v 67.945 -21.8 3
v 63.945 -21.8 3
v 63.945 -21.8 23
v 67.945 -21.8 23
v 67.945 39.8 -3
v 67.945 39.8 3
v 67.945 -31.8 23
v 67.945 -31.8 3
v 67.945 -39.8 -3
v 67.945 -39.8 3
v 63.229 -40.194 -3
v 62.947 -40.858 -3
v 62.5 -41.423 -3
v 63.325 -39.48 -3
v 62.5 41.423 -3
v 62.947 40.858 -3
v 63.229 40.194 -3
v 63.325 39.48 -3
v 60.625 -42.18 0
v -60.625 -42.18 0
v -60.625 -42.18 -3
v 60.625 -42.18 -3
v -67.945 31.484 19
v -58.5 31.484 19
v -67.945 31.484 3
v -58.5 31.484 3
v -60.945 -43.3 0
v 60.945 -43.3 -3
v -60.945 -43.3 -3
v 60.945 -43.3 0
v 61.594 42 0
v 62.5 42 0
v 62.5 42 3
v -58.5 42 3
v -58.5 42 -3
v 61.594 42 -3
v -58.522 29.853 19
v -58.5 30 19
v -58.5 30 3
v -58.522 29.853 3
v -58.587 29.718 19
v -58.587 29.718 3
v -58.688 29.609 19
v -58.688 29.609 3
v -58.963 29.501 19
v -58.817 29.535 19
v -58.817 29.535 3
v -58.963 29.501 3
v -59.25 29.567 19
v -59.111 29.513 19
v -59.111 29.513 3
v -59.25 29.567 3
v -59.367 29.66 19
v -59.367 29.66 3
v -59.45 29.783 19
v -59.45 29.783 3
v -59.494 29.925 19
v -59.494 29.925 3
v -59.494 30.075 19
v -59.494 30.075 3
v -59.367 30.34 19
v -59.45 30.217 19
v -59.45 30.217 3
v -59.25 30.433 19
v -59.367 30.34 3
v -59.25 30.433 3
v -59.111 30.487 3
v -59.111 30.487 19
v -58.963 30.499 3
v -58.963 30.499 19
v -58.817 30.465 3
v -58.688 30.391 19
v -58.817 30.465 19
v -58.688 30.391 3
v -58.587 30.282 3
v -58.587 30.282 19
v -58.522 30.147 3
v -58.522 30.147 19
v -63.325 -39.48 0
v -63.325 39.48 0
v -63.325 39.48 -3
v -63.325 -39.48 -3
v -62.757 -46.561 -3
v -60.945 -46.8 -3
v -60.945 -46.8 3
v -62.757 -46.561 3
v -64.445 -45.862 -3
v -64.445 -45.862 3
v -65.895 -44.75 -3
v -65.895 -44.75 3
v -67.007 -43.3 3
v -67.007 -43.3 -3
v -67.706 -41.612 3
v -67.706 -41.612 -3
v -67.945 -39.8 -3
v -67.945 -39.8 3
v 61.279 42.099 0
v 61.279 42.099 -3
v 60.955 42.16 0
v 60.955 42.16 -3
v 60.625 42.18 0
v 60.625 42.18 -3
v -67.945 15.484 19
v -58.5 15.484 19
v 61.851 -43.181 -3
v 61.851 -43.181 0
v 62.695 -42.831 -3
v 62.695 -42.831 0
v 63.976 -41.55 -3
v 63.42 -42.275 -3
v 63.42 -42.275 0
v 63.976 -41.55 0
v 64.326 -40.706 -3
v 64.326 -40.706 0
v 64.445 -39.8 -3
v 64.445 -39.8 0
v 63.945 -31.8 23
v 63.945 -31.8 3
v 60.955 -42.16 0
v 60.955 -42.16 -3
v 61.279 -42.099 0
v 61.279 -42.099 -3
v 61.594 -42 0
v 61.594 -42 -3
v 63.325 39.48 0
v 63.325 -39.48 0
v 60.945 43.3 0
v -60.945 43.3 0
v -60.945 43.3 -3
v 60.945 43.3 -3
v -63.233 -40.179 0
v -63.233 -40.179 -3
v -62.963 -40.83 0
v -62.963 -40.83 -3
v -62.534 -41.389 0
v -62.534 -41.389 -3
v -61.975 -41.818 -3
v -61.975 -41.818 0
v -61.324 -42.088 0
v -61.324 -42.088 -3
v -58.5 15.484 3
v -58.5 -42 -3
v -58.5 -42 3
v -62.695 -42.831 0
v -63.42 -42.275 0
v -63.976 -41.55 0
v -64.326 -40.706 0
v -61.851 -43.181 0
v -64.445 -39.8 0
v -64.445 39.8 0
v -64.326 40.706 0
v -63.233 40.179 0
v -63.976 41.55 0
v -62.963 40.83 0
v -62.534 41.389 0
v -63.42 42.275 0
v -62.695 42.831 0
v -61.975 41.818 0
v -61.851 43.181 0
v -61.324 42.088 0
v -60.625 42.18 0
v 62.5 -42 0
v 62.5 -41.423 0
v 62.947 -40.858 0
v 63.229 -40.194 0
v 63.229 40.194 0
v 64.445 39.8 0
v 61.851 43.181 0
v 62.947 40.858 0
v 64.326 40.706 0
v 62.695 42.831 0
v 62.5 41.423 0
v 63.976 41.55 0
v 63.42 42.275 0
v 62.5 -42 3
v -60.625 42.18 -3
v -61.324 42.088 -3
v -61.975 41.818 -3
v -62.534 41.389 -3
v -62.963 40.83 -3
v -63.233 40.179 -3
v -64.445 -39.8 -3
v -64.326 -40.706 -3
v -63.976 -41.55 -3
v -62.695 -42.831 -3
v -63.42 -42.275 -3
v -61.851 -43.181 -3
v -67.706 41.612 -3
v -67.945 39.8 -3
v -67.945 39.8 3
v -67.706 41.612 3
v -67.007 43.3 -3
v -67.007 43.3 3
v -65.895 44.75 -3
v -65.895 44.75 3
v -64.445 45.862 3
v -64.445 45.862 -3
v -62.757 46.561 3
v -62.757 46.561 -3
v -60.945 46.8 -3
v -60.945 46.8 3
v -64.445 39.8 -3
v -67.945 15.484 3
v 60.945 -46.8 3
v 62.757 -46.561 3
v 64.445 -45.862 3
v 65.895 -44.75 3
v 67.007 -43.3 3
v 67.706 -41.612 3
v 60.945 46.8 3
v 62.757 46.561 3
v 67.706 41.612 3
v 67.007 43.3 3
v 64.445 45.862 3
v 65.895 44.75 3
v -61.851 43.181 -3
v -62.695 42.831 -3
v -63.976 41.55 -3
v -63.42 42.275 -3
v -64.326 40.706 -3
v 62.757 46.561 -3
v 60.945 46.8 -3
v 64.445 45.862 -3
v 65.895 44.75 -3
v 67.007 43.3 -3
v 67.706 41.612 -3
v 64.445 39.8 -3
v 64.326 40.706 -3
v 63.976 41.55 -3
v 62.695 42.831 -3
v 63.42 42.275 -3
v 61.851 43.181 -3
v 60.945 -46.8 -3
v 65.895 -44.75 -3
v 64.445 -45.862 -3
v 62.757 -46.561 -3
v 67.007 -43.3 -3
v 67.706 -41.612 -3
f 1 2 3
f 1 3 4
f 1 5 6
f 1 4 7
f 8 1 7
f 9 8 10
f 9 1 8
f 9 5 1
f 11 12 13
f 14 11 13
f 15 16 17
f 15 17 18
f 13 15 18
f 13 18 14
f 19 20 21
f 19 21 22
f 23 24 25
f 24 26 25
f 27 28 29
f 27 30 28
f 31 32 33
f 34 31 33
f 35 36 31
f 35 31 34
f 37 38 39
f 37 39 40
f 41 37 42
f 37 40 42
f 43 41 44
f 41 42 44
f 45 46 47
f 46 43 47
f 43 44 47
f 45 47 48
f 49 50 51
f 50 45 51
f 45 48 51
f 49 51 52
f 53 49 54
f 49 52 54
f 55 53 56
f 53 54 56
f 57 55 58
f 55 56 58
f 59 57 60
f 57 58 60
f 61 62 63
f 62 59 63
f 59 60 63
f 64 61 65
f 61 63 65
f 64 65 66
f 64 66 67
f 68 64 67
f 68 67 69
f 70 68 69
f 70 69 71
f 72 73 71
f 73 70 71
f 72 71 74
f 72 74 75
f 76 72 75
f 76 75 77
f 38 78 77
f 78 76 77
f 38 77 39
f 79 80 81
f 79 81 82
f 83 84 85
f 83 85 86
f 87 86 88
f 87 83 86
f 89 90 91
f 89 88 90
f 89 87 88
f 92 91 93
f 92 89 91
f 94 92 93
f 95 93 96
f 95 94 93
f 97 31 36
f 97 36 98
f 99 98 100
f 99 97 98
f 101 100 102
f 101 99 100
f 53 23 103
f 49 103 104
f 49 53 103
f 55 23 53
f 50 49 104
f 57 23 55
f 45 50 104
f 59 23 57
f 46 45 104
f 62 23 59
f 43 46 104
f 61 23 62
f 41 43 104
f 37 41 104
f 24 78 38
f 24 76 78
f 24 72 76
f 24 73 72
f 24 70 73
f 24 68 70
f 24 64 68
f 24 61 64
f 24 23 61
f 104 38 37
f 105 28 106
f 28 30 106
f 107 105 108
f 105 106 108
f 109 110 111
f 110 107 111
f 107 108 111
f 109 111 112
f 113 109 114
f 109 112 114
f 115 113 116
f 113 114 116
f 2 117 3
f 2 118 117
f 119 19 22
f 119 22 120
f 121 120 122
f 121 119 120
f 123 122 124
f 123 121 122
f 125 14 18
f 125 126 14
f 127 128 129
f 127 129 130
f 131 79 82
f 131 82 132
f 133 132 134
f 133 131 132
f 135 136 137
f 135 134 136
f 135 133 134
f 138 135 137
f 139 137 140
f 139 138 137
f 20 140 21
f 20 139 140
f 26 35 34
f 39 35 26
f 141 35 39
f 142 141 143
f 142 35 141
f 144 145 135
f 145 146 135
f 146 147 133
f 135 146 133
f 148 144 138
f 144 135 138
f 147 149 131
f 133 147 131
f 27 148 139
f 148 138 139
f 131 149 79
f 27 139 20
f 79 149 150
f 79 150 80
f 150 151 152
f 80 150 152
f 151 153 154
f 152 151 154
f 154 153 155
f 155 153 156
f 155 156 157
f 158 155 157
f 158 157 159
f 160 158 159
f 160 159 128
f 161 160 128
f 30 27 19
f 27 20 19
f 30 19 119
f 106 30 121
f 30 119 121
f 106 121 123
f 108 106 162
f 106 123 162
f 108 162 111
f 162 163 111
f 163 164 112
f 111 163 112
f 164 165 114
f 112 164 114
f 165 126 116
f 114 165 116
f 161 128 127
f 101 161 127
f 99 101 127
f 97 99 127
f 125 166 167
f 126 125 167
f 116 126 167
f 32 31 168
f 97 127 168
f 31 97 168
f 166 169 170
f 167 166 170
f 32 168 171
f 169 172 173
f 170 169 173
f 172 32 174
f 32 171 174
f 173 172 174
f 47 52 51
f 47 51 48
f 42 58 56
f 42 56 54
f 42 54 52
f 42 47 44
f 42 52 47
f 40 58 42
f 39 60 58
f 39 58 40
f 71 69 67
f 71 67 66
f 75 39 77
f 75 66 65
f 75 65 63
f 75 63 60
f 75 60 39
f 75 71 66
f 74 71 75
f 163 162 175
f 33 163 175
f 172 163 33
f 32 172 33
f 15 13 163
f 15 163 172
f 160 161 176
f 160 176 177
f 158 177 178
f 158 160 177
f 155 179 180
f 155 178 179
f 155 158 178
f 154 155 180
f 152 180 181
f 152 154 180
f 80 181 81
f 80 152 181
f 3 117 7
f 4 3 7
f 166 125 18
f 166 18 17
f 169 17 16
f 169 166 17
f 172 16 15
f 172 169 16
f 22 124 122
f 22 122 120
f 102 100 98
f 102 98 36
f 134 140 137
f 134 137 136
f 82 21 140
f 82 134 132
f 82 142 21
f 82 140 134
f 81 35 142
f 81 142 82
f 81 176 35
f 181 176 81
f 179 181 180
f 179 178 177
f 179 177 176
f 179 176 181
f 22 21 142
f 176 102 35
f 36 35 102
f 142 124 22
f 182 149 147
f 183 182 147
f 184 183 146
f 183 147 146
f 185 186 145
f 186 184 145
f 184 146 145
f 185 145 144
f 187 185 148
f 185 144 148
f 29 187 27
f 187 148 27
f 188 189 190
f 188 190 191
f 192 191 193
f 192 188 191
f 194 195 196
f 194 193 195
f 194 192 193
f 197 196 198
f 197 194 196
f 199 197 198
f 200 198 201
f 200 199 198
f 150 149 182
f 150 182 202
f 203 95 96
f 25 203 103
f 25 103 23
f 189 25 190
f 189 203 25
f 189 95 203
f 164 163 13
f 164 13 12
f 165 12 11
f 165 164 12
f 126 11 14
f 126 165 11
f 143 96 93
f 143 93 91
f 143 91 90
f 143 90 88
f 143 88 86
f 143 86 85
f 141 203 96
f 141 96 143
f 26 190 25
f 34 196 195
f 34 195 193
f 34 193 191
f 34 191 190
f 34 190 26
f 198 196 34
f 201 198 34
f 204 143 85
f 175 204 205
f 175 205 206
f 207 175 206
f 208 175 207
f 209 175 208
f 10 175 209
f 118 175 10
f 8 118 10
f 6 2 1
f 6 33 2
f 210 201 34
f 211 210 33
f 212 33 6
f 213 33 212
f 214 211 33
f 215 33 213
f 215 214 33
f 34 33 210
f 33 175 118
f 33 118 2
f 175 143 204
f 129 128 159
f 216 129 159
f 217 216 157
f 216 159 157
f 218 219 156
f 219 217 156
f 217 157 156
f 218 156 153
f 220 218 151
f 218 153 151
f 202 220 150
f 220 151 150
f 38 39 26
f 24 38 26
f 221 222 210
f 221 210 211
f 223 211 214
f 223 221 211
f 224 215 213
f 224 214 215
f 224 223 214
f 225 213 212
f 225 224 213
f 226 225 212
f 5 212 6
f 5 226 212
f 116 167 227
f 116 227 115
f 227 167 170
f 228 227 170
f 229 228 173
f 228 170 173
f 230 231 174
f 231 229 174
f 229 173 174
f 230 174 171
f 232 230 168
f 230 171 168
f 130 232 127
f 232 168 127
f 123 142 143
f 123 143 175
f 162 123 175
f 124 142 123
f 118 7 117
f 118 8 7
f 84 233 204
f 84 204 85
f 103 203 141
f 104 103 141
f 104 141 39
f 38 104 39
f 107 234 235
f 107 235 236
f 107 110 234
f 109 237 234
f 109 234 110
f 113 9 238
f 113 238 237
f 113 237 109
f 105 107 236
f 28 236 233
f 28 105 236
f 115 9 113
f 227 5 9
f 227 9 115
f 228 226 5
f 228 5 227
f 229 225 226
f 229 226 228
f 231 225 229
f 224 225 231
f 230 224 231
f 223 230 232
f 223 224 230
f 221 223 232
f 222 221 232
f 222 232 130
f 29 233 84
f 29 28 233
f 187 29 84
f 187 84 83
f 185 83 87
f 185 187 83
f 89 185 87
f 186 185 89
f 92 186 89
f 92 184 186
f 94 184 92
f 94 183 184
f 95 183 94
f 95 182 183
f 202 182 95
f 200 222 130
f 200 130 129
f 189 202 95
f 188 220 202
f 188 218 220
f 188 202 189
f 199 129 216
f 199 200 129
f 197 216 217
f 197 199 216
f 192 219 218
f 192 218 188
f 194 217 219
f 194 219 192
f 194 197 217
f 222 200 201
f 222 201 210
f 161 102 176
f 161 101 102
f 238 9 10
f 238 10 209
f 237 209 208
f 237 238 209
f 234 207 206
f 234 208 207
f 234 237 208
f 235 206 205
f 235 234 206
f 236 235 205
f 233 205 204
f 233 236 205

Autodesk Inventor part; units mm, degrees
ref_plane "YZ Plane" through (0, 0, 0) normal (1, 0, 0) x (0, 1, 0)
ref_plane "XZ Plane" through (0, 0, 0) normal (0, 1, 0) x (-1, 0, 0)
ref_plane "XY Plane" through (0, 0, 0) normal (0, 0, 1) x (1, 0, 0)
ref_plane "Work Plane1" through (-7.109, -3.9363, 0) normal (0, 0, 1) x (1, 0, 0)
sketch "Sketch1" plane through (-7.109, -3.9363, 0) normal (0, 0, 1) x (1, 0, 0)
  line L0 (71.054, 43.7363) -> (71.054, -35.8637) construction
  arc A0 (71.054, 43.7363) -> (68.054, 46.7363) centre (68.054, 43.7363) ccw construction
  line L1 (-53.836, 46.7363) -> (68.054, 46.7363) construction
  arc A1 (-53.836, 46.7363) -> (-56.836, 43.7363) centre (-53.836, 43.7363) ccw construction
  line L2 (-56.836, -35.8637) -> (-56.836, 43.7363) construction
  arc A2 (-56.836, -35.8637) -> (-53.836, -38.8637) centre (-53.836, -35.8637) ccw construction
  line L3 (68.054, -38.8637) -> (-53.836, -38.8637) construction
  arc A3 (68.054, -38.8637) -> (71.054, -35.8637) centre (68.054, -35.8637) ccw construction
  line L4 (-56.516, -35.5437) -> (-56.516, 43.4163) construction
  arc A4 (-53.516, 46.4163) -> (-56.516, 43.4163) centre (-53.516, 43.4163) ccw construction
  line L5 (-53.516, 46.4163) -> (67.734, 46.4163) construction
  arc A5 (70.734, 43.4163) -> (67.734, 46.4163) centre (67.734, 43.4163) ccw construction
  line L6 (70.734, 43.4163) -> (70.734, -35.5437) construction
  arc A6 (67.734, -38.5437) -> (70.734, -35.5437) centre (67.734, -35.5437) ccw construction
  line L7 (67.734, -38.5437) -> (-53.516, -38.5437) construction
  arc A7 (-56.516, -35.5437) -> (-53.516, -38.5437) centre (-53.516, -35.5437) ccw construction
  arc A8 (75.054, 43.7363) -> (68.054, 50.7363) centre (68.054, 43.7363) ccw
  line L8 (75.054, 43.7363) -> (75.054, -35.8637)
  arc A9 (68.054, -42.8637) -> (75.054, -35.8637) centre (68.054, -35.8637) ccw
  line L9 (68.054, -42.8637) -> (-53.836, -42.8637)
  arc A10 (-60.836, -35.8637) -> (-53.836, -42.8637) centre (-53.836, -35.8637) ccw
  line L10 (-60.836, -35.8637) -> (-60.836, 43.7363)
  arc A11 (-53.836, 50.7363) -> (-60.836, 43.7363) centre (-53.836, 43.7363) ccw
  line L11 (-53.836, 50.7363) -> (68.054, 50.7363)
  circle A12 centre (53.6173, 21.8363) radius 4 construction
  circle A13 centre (53.6173, 3.8363) radius 4 construction
  circle A14 centre (53.6173, -14.1637) radius 4 construction
  circle A15 centre (35.6173, 21.8363) radius 4 construction
  circle A16 centre (35.6173, 3.8363) radius 4 construction
  circle A17 centre (35.6173, -14.1637) radius 4 construction
  circle A18 centre (17.6173, 21.8363) radius 4 construction
  circle A19 centre (17.6173, 3.8363) radius 4 construction
  circle A20 centre (17.6173, -14.1637) radius 4 construction
  circle A21 centre (-0.3827, 21.8363) radius 4 construction
  circle A22 centre (-0.3827, 3.8363) radius 4 construction
  circle A23 centre (-0.3827, -14.1637) radius 4 construction
  circle A24 centre (-18.3827, 21.8363) radius 4 construction
  circle A25 centre (-18.3827, 3.8363) radius 4 construction
  circle A26 centre (-18.3827, -14.1637) radius 4 construction
  circle A27 centre (-36.3827, 21.8363) radius 4 construction
  circle A28 centre (-36.3827, 3.8363) radius 4 construction
  circle A29 centre (-36.3827, -14.1637) radius 4 construction
  circle A30 centre (-36.3827, 30.7863) radius 4.375 construction
  circle A31 centre (-18.3827, 30.7863) radius 4.375 construction
  circle A32 centre (-0.3827, 30.7863) radius 4.375 construction
  circle A33 centre (17.6173, 30.7863) radius 4.375 construction
  circle A34 centre (35.6173, 30.7863) radius 4.375 construction
  circle A35 centre (53.6173, 30.7863) radius 4.375 construction
  circle A36 centre (-36.3827, 12.7863) radius 4.375 construction
  circle A37 centre (-18.3827, 12.7863) radius 4.375 construction
  circle A38 centre (-0.3827, 12.7863) radius 4.375 construction
  circle A39 centre (17.6173, 12.7863) radius 4.375 construction
  circle A40 centre (35.6173, 12.7863) radius 4.375 construction
  circle A41 centre (53.6173, 12.7863) radius 4.375 construction
  circle A42 centre (-36.3827, -5.2137) radius 4.375 construction
  circle A43 centre (-18.3827, -5.2137) radius 4.375 construction
  circle A44 centre (-0.3827, -5.2137) radius 4.375 construction
  circle A45 centre (17.6173, -5.2137) radius 4.375 construction
  circle A46 centre (35.6173, -5.2137) radius 4.375 construction
  circle A47 centre (53.6173, -5.2137) radius 4.375 construction
  circle A48 centre (-36.3827, -23.2137) radius 4.375 construction
  circle A49 centre (-18.3827, -23.2137) radius 4.375 construction
  circle A50 centre (-0.3827, -23.2137) radius 4.375 construction
  circle A51 centre (17.6173, -23.2137) radius 4.375 construction
  circle A52 centre (35.6173, -23.2137) radius 4.375 construction
  circle A53 centre (53.6173, -23.2137) radius 4.375 construction
  arc A54 (57.7361, 42.9363) -> (61.1439, 37.9635) centre (61.609, 41.9363) ccw construction
  line L12 (-39.518, 42.9363) -> (57.7361, 42.9363) construction
  arc A55 (-42.9259, 37.9635) -> (-39.518, 42.9363) centre (-43.391, 41.9363) ccw construction
  arc A56 (-48.391, 33.7282) -> (-42.9259, 37.9635) centre (-46.891, 37.4363) ccw construction
  line L13 (-48.391, -25.8556) -> (-48.391, 33.7282) construction
  arc A57 (-42.9259, -30.0908) -> (-48.391, -25.8556) centre (-46.891, -29.5637) ccw construction
  arc A58 (-39.518, -35.0637) -> (-42.9259, -30.0908) centre (-43.391, -34.0637) ccw construction
  line L14 (57.7361, -35.0637) -> (-39.518, -35.0637) construction
  arc A59 (61.1439, -30.0908) -> (57.7361, -35.0637) centre (61.609, -34.0637) ccw construction
  arc A60 (66.609, -25.8556) -> (61.1439, -30.0908) centre (65.109, -29.5637) ccw construction
  line L15 (66.609, 33.7282) -> (66.609, -25.8556) construction
  arc A61 (61.1439, 37.9635) -> (66.609, 33.7282) centre (65.109, 37.4363) ccw construction
  arc A62 (67.609, -27.9054) -> (62.6207, -31.2394) centre (65.109, -29.5637) ccw construction
  arc A63 (62.6207, -31.2394) -> (59.373, -36.0637) centre (61.609, -34.0637) ccw construction
  line L16 (59.373, -36.0637) -> (-41.1549, -36.0637) construction
  arc A64 (-41.1549, -36.0637) -> (-44.4026, -31.2394) centre (-43.391, -34.0637) ccw construction
  arc A65 (-44.4026, -31.2394) -> (-49.391, -27.9054) centre (-46.891, -29.5637) ccw construction
  line L17 (-49.391, -27.9054) -> (-49.391, 35.778) construction
  arc A66 (-49.391, 35.778) -> (-44.4026, 39.112) centre (-46.891, 37.4363) ccw construction
  arc A67 (-44.4026, 39.112) -> (-41.1549, 43.9363) centre (-43.391, 41.9363) ccw construction
  line L18 (-41.1549, 43.9363) -> (59.373, 43.9363) construction
  arc A68 (59.373, 43.9363) -> (62.6207, 39.112) centre (61.609, 41.9363) ccw construction
  arc A69 (62.6207, 39.112) -> (67.609, 35.778) centre (65.109, 37.4363) ccw construction
  line L19 (67.609, 35.778) -> (67.609, -27.9054) construction
  line L20 (69.609, 45.9363) -> (-51.391, 45.9363)
  line L21 (-51.391, 45.9363) -> (-51.391, -38.0637)
  line L22 (-51.391, -38.0637) -> (69.609, -38.0637)
  line L23 (69.609, -38.0637) -> (69.609, 45.9363)
  point P0 (7.109, 3.9363)
  dimension "d0" = 4
  dimension "d1" = 1
  dimension "d10" = 2
  dimension "d11" = 2
  dimension "d12" = 2
  dimension "d13" = 2
extrude "Extrusion1" add sketch "Sketch1" along normal blind 3
sketch "Sketch2" plane through (-7.109, -3.9363, 0) normal (0, 0, -1) x (-1, 0, 0)
  line L0 (-71.054, 43.7363) -> (-71.054, -35.8637) construction
  arc A0 (-68.054, 46.7363) -> (-71.054, 43.7363) centre (-68.054, 43.7363) ccw construction
  line L1 (53.836, 46.7363) -> (-68.054, 46.7363) construction
  arc A1 (56.836, 43.7363) -> (53.836, 46.7363) centre (53.836, 43.7363) ccw construction
  line L2 (56.836, -35.8637) -> (56.836, 43.7363) construction
  arc A2 (53.836, -38.8637) -> (56.836, -35.8637) centre (53.836, -35.8637) ccw construction
  line L3 (-68.054, -38.8637) -> (53.836, -38.8637) construction
  arc A3 (-71.054, -35.8637) -> (-68.054, -38.8637) centre (-68.054, -35.8637) ccw construction
  line L4 (56.516, -35.5437) -> (56.516, 43.4163) construction
  arc A4 (56.516, 43.4163) -> (53.516, 46.4163) centre (53.516, 43.4163) ccw construction
  line L5 (53.516, 46.4163) -> (-67.734, 46.4163) construction
  arc A5 (-67.734, 46.4163) -> (-70.734, 43.4163) centre (-67.734, 43.4163) ccw construction
  line L6 (-70.734, 43.4163) -> (-70.734, -35.5437) construction
  arc A6 (-70.734, -35.5437) -> (-67.734, -38.5437) centre (-67.734, -35.5437) ccw construction
  line L7 (-67.734, -38.5437) -> (53.516, -38.5437) construction
  arc A7 (53.516, -38.5437) -> (56.516, -35.5437) centre (53.516, -35.5437) ccw construction
  arc A8 (-68.054, 47.2363) -> (-71.554, 43.7363) centre (-68.054, 43.7363) ccw
  line L8 (-71.554, 43.7363) -> (-71.554, -35.8637)
  arc A9 (-71.554, -35.8637) -> (-68.054, -39.3637) centre (-68.054, -35.8637) ccw
  line L9 (-68.054, -39.3637) -> (53.836, -39.3637)
  arc A10 (53.836, -39.3637) -> (57.336, -35.8637) centre (53.836, -35.8637) ccw
  line L10 (57.336, -35.8637) -> (57.336, 43.7363)
  arc A11 (57.336, 43.7363) -> (53.836, 47.2363) centre (53.836, 43.7363) ccw
  line L11 (53.836, 47.2363) -> (-68.054, 47.2363)
  arc A12 (56.216, 43.4163) -> (53.516, 46.1163) centre (53.516, 43.4163) ccw
  line L12 (56.216, 43.4163) -> (56.216, -35.5437)
  arc A13 (53.516, -38.2437) -> (56.216, -35.5437) centre (53.516, -35.5437) ccw
  line L13 (53.516, -38.2437) -> (-67.734, -38.2437)
  arc A14 (-70.434, -35.5437) -> (-67.734, -38.2437) centre (-67.734, -35.5437) ccw
  line L14 (-70.434, -35.5437) -> (-70.434, 43.4163)
  arc A15 (-67.734, 46.1163) -> (-70.434, 43.4163) centre (-67.734, 43.4163) ccw
  line L15 (-67.734, 46.1163) -> (53.516, 46.1163)
  line L16 (-69.609, 45.9363) -> (-69.609, -38.0637) projected
  line L17 (-69.609, -38.0637) -> (51.391, -38.0637) projected
  line L18 (51.391, -38.0637) -> (51.391, 45.9363) projected
  line L19 (51.391, 45.9363) -> (-69.609, 45.9363) projected
  arc A16 (-68.054, 50.7363) -> (-75.054, 43.7363) centre (-68.054, 43.7363) ccw projected
  line L20 (-68.054, 50.7363) -> (53.836, 50.7363) projected
  arc A17 (60.836, 43.7363) -> (53.836, 50.7363) centre (53.836, 43.7363) ccw projected
  line L21 (60.836, 43.7363) -> (60.836, -35.8637) projected
  arc A18 (53.836, -42.8637) -> (60.836, -35.8637) centre (53.836, -35.8637) ccw projected
  line L22 (53.836, -42.8637) -> (-68.054, -42.8637) projected
  arc A19 (-75.054, -35.8637) -> (-68.054, -42.8637) centre (-68.054, -35.8637) ccw projected
  line L23 (-75.054, -35.8637) -> (-75.054, 43.7363) projected
  point P0 (-7.109, 3.9363)
  dimension "d4" = 0.5
  dimension "d5" = 0.3
extrude "Extrusion2" add sketch "Sketch2" along normal blind 3 contours L12 A13 L13 A14 L17 L18 L19 A15 L15 A12 | L16 A14 L14 A15 | L20 A17 L21 A18 L22 A19 L23 A16
sketch "Sketch3" plane through (-7.109, -3.9363, 3) normal (0, 0, 1) x (1, 0, 0)
  line L0 (69.609, 45.9363) -> (69.609, -38.0637) projected
  line L1 (69.609, -38.0637) -> (-51.391, -38.0637) projected
  line L2 (-51.391, -38.0637) -> (-51.391, 45.9363) projected
  line L3 (-51.391, 45.9363) -> (69.609, 45.9363) projected
  arc A0 (75.054, 43.7363) -> (68.054, 50.7363) centre (68.054, 43.7363) ccw projected
  line L4 (68.054, 50.7363) -> (-53.836, 50.7363) projected
  arc A1 (-53.836, 50.7363) -> (-60.836, 43.7363) centre (-53.836, 43.7363) ccw projected
  line L5 (-60.836, 43.7363) -> (-60.836, -35.8637) projected
  arc A2 (-60.836, -35.8637) -> (-53.836, -42.8637) centre (-53.836, -35.8637) ccw projected
  line L6 (-53.836, -42.8637) -> (68.054, -42.8637) projected
  arc A3 (68.054, -42.8637) -> (75.054, -35.8637) centre (68.054, -35.8637) ccw projected
  line L7 (75.054, -35.8637) -> (75.054, 43.7363) projected
  line L8 (75.054, 25.8105) -> (71.9538, 25.8105)
  line L9 (70.434, 43.4163) -> (70.434, -35.5437) projected
  arc A4 (75.054, 43.7363) -> (68.054, 50.7363) centre (68.054, 43.7363) ccw projected
  line L10 (75.054, -27.8637) -> (71.054, -27.8637)
  line L11 (71.054, -27.8637) -> (71.054, -17.8637)
  line L12 (71.054, -17.8637) -> (75.054, -17.8637)
  line L13 (75.054, -17.8637) -> (75.054, -27.8637)
  circle A5 centre (70.109, -26.0637) radius 0.5 projected
  line L14 (67.609, -23.0637) -> (67.609, -29.0637) projected
  line L15 (67.609, -29.0637) -> (72.609, -29.0637) projected
  line L16 (72.609, -23.0637) -> (72.609, -29.0637) projected
  line L17 (67.609, -23.0637) -> (72.609, -23.0637) projected
  point P0 (7.109, 3.9363)
  point P1 (71.7253, 49.6963)
  dimension "d14" = 4
  dimension "d15" = 10
  dimension "d23" = 15
extrude "Extrusion3" add sketch "Sketch3" along normal blind 20 contours L17 L16 L10 L11 | L11 L12 L7 L10 L16 L17
ref_plane "Work Plane2" through (0, -39.8, -3) normal (1, 0, 0) x (0, 0, -1)
sketch "Sketch4" plane through (-7.109, -3.9363, 3) normal (0, 0, 1) x (1, 0, 0)
  arc A0 (75.054, 43.7363) -> (68.054, 50.7363) centre (68.054, 43.7363) ccw projected
  line L0 (68.054, 50.7363) -> (-53.836, 50.7363) projected
  arc A1 (-53.836, 50.7363) -> (-60.836, 43.7363) centre (-53.836, 43.7363) ccw projected
  line L1 (-60.836, 43.7363) -> (-60.836, -35.8637) projected
  arc A2 (-60.836, -35.8637) -> (-53.836, -42.8637) centre (-53.836, -35.8637) ccw projected
  line L2 (-53.836, -42.8637) -> (68.054, -42.8637) projected
  arc A3 (68.054, -42.8637) -> (75.054, -35.8637) centre (68.054, -35.8637) ccw projected
  line L3 (75.054, -17.8637) -> (75.054, 43.7363) projected
  line L4 (71.054, -27.8637) -> (71.054, -17.8637) projected
  line L5 (69.609, 45.9363) -> (69.609, -38.0637) projected
  line L6 (69.609, -38.0637) -> (-51.391, -38.0637) projected
  line L7 (-51.391, -38.0637) -> (-51.391, 45.9363) projected
  line L8 (-51.391, 45.9363) -> (69.609, 45.9363) projected
  circle A4 centre (-51.891, 33.9363) radius 0.5 projected
  line L9 (-49.391, 30.9363) -> (-49.391, 36.9363) projected
  line L10 (-49.391, 36.9363) -> (-54.391, 36.9363) projected
  line L11 (-54.391, 30.9363) -> (-54.391, 36.9363) projected
  line L12 (-49.391, 30.9363) -> (-54.391, 30.9363) projected
  line L13 (-51.391, -38.0637) -> (-51.391, 45.9363) projected
  line L14 (-60.836, -35.8637) -> (-60.836, 43.7363) projected
  line L15 (-51.391, 35.4207) -> (-60.836, 35.4207)
  line L16 (-60.836, 35.4207) -> (-60.836, 19.4207)
  line L17 (-60.836, 19.4207) -> (-51.391, 19.4207)
  line L18 (-51.391, 19.4207) -> (-51.391, 35.4207)
  line L19 (71.054, -17.8637) -> (75.054, -17.8637) projected
  line L20 (75.054, -35.8637) -> (75.054, -27.8637) projected
  line L21 (75.054, -27.8637) -> (71.054, -27.8637) projected
  point P0 (7.109, 3.9363)
  dimension "d20" = 16
extrude "Extrusion4" add sketch "Sketch4" along normal blind 16 contours L15 L11 L12 L7 L17 L1 | L15 L7 L12 L11
equation "\"d10\" = d11"
equation "\"d12\" = d11"
equation "\"d13\" = d11"
properties part number "07_Omnivision_wellplate_traystage"
